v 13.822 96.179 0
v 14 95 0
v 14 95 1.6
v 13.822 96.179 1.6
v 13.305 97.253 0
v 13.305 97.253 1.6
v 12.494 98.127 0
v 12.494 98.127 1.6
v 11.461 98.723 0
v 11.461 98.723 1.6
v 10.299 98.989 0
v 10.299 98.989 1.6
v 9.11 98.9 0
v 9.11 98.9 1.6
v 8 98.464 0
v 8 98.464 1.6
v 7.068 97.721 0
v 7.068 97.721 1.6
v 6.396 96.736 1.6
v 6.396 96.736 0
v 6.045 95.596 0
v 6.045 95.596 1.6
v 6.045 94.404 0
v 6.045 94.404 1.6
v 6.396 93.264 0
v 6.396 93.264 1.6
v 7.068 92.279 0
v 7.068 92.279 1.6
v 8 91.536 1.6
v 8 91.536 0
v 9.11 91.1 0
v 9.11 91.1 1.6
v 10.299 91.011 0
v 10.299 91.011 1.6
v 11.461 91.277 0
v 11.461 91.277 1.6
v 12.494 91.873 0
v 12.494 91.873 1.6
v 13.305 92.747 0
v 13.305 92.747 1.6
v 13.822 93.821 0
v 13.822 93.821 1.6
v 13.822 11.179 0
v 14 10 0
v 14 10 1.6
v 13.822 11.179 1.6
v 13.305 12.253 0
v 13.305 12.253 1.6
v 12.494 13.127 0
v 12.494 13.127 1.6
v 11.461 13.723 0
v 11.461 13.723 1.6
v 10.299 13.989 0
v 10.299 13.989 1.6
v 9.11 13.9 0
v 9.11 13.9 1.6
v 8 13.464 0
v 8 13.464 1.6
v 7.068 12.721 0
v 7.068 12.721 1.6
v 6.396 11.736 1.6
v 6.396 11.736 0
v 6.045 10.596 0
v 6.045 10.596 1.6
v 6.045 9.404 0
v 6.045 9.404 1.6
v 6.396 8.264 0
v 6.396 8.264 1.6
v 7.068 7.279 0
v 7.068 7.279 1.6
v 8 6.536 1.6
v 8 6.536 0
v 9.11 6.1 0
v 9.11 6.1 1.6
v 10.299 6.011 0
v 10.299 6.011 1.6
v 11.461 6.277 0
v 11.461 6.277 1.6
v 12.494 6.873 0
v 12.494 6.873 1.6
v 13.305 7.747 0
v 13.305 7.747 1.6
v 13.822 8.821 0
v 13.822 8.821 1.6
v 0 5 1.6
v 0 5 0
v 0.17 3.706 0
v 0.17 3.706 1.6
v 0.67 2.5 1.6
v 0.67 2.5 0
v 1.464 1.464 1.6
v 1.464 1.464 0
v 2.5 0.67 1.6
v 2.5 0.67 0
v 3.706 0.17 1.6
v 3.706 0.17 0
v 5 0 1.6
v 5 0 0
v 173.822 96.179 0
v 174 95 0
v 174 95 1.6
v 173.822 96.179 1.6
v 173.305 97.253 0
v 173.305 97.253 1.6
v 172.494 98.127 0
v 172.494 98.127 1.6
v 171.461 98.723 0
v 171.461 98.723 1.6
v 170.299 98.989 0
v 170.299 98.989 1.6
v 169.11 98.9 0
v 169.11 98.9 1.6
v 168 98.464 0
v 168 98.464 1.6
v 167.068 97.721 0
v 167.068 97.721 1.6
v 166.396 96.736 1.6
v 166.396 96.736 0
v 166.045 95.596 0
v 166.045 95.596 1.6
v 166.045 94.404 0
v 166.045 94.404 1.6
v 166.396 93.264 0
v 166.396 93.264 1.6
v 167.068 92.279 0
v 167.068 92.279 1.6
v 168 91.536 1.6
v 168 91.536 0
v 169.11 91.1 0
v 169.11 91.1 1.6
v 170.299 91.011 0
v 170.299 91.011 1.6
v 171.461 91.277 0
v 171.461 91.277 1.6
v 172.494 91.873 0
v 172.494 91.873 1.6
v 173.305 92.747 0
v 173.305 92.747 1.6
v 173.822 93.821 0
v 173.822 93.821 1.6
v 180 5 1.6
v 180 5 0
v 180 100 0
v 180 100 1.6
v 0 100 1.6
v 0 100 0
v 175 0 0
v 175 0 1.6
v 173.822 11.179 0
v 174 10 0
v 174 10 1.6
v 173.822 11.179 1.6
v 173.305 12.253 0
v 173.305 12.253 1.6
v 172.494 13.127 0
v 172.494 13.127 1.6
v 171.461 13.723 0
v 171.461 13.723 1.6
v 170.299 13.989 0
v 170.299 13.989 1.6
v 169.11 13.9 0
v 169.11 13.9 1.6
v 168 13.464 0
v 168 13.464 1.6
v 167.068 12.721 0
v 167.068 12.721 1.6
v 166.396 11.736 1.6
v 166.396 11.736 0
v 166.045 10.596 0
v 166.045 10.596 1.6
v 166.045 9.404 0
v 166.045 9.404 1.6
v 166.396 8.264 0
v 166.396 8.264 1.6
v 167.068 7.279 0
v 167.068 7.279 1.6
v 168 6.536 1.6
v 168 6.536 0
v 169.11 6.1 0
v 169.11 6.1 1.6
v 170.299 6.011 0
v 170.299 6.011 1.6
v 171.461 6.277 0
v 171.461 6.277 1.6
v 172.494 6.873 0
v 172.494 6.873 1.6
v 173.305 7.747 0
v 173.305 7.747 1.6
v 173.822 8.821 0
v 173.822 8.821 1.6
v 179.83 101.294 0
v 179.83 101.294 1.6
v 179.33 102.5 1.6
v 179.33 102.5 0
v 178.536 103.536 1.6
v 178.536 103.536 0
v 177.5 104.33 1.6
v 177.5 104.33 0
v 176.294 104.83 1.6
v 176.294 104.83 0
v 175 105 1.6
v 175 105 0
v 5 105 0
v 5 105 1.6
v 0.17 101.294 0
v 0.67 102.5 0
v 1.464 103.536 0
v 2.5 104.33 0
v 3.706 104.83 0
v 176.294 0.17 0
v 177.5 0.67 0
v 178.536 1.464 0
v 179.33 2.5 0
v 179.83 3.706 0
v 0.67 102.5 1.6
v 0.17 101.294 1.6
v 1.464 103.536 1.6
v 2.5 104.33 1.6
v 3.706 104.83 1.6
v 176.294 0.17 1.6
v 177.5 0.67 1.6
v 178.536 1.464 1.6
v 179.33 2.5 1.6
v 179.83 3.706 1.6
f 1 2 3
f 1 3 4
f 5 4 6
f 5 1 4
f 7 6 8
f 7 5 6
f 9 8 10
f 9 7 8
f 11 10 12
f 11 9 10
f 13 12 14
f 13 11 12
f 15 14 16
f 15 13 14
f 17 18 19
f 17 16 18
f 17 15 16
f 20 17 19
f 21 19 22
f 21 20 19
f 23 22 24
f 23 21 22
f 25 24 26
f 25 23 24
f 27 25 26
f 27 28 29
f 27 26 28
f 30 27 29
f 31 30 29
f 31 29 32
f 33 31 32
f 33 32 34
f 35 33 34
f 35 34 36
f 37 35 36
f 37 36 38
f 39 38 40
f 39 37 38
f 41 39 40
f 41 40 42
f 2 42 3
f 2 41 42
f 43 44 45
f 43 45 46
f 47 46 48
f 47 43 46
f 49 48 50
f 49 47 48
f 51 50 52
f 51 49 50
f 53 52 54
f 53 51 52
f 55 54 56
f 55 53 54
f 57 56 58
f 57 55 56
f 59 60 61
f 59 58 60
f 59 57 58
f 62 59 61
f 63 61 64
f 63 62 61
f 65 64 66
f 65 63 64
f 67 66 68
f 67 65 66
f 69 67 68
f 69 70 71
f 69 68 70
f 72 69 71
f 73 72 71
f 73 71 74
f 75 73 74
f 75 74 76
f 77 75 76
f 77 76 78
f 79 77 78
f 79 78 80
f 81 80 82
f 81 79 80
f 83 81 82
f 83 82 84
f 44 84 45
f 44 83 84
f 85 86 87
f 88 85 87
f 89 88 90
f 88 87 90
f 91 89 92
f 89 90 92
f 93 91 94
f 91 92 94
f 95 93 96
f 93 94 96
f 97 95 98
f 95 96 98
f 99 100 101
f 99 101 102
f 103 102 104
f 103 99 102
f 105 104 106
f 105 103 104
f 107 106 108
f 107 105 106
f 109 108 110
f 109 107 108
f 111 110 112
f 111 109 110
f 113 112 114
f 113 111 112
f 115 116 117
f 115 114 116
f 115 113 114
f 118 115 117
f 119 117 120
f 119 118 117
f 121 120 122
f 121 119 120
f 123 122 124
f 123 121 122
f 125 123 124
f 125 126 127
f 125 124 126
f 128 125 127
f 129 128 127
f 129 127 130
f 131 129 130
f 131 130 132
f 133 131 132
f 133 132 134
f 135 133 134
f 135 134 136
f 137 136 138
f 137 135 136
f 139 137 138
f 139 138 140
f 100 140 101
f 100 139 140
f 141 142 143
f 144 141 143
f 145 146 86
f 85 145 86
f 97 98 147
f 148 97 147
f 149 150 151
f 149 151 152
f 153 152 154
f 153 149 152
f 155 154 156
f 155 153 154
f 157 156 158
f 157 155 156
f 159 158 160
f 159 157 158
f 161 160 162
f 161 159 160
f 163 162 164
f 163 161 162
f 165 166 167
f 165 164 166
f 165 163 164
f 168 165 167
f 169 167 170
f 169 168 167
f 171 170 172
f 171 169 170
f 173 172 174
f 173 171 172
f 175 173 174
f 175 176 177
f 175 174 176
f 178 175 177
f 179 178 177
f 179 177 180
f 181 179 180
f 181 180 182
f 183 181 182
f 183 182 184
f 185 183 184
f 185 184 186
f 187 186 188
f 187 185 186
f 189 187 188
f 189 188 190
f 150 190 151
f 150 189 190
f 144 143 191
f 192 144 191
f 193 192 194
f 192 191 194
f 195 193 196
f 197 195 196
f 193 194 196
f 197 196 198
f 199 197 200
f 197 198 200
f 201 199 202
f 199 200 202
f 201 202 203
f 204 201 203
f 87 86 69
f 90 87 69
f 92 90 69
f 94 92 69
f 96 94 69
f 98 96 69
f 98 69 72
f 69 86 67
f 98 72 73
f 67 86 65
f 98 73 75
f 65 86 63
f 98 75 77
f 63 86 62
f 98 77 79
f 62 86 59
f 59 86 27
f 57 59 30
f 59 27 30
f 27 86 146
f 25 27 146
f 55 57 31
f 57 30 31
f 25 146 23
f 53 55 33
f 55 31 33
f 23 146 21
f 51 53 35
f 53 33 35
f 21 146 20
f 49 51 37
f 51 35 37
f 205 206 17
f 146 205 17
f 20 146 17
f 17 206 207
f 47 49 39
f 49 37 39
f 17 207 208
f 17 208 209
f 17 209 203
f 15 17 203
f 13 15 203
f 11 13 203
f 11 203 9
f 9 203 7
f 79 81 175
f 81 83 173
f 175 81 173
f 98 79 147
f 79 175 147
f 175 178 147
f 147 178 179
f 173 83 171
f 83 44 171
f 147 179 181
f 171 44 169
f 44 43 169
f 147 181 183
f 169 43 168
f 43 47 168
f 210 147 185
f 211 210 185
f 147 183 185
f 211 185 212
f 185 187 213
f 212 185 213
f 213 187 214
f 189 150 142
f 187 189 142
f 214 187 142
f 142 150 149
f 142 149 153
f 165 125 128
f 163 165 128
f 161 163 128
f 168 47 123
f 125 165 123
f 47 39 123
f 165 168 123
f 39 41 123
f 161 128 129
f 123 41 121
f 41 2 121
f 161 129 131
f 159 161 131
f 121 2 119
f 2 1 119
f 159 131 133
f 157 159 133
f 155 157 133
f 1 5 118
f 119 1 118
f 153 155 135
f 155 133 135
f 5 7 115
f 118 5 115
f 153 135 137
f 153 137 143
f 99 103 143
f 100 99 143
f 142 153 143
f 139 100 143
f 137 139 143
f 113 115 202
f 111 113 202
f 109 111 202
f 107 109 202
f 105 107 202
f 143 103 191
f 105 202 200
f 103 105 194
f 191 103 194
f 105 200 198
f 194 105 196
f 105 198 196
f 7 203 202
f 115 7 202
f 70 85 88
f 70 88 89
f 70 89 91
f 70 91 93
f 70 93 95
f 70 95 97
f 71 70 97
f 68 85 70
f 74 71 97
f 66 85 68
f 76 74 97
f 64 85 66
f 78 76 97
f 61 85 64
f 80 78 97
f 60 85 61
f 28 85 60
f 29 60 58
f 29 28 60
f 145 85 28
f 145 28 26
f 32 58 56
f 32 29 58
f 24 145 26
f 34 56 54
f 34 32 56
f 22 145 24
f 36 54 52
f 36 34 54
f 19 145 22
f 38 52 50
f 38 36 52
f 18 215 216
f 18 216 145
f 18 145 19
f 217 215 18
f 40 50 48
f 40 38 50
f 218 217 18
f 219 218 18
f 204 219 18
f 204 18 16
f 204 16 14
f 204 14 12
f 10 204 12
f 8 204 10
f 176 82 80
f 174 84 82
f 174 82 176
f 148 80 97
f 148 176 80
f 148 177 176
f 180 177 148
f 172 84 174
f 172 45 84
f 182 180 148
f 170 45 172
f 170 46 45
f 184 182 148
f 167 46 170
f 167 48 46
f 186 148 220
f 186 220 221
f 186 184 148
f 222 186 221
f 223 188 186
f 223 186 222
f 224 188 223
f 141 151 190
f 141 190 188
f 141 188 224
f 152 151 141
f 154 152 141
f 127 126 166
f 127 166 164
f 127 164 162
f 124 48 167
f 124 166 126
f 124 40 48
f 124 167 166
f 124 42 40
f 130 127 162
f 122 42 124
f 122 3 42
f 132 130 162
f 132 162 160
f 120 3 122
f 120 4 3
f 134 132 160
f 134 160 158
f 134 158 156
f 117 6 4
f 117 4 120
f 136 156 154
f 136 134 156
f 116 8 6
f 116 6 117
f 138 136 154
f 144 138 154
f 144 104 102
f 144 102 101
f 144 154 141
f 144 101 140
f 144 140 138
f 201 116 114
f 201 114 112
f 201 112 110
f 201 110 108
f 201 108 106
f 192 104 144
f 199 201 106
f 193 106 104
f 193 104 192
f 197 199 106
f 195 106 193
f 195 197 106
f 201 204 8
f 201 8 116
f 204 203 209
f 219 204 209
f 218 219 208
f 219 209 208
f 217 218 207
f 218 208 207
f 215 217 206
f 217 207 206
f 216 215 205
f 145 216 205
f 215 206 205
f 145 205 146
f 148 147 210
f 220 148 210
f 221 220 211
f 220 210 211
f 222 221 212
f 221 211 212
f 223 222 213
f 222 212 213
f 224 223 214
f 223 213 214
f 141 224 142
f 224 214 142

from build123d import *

# Parameters (mm, degrees)
EXTRUDE_1_DEPTH          = 1.6
CUT_EXTRUDE_1_DEPTH      = 209.392802179
CUT_EXTRUDE_1_DEPTH_BACK = 209.392802179
SKETCH_2_R               = 4


with BuildPart() as part:
    # ｽｹｯﾁ1 → ﾎﾞｽ - 押し出し1 (new body)
    with BuildSketch(Plane.XY):
        with BuildLine():
            Line((5, 0), (175, 0))
            ThreePointArc((175, 0), (178.535533906, 1.464466094), (180, 5))
            Line((180, 5), (180, 100))
            ThreePointArc((180, 100), (178.535533906, 103.535533906), (175, 105))
            Line((175, 105), (5, 105))
            ThreePointArc((5, 105), (1.464466094, 103.535533906), (0, 100))
            Line((0, 100), (0, 5))
            ThreePointArc((0, 5), (1.464466094, 1.464466094), (5, 0))
        make_face()
    extrude(amount=EXTRUDE_1_DEPTH)

    # ｽｹｯﾁ2 → ｶｯﾄ - 押し出し1 (cut, two sides: drawn at the far end of the back side and taken through both)
    with BuildSketch(Plane.XY.offset(-CUT_EXTRUDE_1_DEPTH_BACK)):
        with Locations((10, 10)):
            Circle(SKETCH_2_R)
        with Locations((10, 95)):
            Circle(SKETCH_2_R)
        with Locations((170, 10)):
            Circle(SKETCH_2_R)
        with Locations((170, 95)):
            Circle(SKETCH_2_R)
    extrude(amount=CUT_EXTRUDE_1_DEPTH + CUT_EXTRUDE_1_DEPTH_BACK, mode=Mode.SUBTRACT)


solid = part.part
